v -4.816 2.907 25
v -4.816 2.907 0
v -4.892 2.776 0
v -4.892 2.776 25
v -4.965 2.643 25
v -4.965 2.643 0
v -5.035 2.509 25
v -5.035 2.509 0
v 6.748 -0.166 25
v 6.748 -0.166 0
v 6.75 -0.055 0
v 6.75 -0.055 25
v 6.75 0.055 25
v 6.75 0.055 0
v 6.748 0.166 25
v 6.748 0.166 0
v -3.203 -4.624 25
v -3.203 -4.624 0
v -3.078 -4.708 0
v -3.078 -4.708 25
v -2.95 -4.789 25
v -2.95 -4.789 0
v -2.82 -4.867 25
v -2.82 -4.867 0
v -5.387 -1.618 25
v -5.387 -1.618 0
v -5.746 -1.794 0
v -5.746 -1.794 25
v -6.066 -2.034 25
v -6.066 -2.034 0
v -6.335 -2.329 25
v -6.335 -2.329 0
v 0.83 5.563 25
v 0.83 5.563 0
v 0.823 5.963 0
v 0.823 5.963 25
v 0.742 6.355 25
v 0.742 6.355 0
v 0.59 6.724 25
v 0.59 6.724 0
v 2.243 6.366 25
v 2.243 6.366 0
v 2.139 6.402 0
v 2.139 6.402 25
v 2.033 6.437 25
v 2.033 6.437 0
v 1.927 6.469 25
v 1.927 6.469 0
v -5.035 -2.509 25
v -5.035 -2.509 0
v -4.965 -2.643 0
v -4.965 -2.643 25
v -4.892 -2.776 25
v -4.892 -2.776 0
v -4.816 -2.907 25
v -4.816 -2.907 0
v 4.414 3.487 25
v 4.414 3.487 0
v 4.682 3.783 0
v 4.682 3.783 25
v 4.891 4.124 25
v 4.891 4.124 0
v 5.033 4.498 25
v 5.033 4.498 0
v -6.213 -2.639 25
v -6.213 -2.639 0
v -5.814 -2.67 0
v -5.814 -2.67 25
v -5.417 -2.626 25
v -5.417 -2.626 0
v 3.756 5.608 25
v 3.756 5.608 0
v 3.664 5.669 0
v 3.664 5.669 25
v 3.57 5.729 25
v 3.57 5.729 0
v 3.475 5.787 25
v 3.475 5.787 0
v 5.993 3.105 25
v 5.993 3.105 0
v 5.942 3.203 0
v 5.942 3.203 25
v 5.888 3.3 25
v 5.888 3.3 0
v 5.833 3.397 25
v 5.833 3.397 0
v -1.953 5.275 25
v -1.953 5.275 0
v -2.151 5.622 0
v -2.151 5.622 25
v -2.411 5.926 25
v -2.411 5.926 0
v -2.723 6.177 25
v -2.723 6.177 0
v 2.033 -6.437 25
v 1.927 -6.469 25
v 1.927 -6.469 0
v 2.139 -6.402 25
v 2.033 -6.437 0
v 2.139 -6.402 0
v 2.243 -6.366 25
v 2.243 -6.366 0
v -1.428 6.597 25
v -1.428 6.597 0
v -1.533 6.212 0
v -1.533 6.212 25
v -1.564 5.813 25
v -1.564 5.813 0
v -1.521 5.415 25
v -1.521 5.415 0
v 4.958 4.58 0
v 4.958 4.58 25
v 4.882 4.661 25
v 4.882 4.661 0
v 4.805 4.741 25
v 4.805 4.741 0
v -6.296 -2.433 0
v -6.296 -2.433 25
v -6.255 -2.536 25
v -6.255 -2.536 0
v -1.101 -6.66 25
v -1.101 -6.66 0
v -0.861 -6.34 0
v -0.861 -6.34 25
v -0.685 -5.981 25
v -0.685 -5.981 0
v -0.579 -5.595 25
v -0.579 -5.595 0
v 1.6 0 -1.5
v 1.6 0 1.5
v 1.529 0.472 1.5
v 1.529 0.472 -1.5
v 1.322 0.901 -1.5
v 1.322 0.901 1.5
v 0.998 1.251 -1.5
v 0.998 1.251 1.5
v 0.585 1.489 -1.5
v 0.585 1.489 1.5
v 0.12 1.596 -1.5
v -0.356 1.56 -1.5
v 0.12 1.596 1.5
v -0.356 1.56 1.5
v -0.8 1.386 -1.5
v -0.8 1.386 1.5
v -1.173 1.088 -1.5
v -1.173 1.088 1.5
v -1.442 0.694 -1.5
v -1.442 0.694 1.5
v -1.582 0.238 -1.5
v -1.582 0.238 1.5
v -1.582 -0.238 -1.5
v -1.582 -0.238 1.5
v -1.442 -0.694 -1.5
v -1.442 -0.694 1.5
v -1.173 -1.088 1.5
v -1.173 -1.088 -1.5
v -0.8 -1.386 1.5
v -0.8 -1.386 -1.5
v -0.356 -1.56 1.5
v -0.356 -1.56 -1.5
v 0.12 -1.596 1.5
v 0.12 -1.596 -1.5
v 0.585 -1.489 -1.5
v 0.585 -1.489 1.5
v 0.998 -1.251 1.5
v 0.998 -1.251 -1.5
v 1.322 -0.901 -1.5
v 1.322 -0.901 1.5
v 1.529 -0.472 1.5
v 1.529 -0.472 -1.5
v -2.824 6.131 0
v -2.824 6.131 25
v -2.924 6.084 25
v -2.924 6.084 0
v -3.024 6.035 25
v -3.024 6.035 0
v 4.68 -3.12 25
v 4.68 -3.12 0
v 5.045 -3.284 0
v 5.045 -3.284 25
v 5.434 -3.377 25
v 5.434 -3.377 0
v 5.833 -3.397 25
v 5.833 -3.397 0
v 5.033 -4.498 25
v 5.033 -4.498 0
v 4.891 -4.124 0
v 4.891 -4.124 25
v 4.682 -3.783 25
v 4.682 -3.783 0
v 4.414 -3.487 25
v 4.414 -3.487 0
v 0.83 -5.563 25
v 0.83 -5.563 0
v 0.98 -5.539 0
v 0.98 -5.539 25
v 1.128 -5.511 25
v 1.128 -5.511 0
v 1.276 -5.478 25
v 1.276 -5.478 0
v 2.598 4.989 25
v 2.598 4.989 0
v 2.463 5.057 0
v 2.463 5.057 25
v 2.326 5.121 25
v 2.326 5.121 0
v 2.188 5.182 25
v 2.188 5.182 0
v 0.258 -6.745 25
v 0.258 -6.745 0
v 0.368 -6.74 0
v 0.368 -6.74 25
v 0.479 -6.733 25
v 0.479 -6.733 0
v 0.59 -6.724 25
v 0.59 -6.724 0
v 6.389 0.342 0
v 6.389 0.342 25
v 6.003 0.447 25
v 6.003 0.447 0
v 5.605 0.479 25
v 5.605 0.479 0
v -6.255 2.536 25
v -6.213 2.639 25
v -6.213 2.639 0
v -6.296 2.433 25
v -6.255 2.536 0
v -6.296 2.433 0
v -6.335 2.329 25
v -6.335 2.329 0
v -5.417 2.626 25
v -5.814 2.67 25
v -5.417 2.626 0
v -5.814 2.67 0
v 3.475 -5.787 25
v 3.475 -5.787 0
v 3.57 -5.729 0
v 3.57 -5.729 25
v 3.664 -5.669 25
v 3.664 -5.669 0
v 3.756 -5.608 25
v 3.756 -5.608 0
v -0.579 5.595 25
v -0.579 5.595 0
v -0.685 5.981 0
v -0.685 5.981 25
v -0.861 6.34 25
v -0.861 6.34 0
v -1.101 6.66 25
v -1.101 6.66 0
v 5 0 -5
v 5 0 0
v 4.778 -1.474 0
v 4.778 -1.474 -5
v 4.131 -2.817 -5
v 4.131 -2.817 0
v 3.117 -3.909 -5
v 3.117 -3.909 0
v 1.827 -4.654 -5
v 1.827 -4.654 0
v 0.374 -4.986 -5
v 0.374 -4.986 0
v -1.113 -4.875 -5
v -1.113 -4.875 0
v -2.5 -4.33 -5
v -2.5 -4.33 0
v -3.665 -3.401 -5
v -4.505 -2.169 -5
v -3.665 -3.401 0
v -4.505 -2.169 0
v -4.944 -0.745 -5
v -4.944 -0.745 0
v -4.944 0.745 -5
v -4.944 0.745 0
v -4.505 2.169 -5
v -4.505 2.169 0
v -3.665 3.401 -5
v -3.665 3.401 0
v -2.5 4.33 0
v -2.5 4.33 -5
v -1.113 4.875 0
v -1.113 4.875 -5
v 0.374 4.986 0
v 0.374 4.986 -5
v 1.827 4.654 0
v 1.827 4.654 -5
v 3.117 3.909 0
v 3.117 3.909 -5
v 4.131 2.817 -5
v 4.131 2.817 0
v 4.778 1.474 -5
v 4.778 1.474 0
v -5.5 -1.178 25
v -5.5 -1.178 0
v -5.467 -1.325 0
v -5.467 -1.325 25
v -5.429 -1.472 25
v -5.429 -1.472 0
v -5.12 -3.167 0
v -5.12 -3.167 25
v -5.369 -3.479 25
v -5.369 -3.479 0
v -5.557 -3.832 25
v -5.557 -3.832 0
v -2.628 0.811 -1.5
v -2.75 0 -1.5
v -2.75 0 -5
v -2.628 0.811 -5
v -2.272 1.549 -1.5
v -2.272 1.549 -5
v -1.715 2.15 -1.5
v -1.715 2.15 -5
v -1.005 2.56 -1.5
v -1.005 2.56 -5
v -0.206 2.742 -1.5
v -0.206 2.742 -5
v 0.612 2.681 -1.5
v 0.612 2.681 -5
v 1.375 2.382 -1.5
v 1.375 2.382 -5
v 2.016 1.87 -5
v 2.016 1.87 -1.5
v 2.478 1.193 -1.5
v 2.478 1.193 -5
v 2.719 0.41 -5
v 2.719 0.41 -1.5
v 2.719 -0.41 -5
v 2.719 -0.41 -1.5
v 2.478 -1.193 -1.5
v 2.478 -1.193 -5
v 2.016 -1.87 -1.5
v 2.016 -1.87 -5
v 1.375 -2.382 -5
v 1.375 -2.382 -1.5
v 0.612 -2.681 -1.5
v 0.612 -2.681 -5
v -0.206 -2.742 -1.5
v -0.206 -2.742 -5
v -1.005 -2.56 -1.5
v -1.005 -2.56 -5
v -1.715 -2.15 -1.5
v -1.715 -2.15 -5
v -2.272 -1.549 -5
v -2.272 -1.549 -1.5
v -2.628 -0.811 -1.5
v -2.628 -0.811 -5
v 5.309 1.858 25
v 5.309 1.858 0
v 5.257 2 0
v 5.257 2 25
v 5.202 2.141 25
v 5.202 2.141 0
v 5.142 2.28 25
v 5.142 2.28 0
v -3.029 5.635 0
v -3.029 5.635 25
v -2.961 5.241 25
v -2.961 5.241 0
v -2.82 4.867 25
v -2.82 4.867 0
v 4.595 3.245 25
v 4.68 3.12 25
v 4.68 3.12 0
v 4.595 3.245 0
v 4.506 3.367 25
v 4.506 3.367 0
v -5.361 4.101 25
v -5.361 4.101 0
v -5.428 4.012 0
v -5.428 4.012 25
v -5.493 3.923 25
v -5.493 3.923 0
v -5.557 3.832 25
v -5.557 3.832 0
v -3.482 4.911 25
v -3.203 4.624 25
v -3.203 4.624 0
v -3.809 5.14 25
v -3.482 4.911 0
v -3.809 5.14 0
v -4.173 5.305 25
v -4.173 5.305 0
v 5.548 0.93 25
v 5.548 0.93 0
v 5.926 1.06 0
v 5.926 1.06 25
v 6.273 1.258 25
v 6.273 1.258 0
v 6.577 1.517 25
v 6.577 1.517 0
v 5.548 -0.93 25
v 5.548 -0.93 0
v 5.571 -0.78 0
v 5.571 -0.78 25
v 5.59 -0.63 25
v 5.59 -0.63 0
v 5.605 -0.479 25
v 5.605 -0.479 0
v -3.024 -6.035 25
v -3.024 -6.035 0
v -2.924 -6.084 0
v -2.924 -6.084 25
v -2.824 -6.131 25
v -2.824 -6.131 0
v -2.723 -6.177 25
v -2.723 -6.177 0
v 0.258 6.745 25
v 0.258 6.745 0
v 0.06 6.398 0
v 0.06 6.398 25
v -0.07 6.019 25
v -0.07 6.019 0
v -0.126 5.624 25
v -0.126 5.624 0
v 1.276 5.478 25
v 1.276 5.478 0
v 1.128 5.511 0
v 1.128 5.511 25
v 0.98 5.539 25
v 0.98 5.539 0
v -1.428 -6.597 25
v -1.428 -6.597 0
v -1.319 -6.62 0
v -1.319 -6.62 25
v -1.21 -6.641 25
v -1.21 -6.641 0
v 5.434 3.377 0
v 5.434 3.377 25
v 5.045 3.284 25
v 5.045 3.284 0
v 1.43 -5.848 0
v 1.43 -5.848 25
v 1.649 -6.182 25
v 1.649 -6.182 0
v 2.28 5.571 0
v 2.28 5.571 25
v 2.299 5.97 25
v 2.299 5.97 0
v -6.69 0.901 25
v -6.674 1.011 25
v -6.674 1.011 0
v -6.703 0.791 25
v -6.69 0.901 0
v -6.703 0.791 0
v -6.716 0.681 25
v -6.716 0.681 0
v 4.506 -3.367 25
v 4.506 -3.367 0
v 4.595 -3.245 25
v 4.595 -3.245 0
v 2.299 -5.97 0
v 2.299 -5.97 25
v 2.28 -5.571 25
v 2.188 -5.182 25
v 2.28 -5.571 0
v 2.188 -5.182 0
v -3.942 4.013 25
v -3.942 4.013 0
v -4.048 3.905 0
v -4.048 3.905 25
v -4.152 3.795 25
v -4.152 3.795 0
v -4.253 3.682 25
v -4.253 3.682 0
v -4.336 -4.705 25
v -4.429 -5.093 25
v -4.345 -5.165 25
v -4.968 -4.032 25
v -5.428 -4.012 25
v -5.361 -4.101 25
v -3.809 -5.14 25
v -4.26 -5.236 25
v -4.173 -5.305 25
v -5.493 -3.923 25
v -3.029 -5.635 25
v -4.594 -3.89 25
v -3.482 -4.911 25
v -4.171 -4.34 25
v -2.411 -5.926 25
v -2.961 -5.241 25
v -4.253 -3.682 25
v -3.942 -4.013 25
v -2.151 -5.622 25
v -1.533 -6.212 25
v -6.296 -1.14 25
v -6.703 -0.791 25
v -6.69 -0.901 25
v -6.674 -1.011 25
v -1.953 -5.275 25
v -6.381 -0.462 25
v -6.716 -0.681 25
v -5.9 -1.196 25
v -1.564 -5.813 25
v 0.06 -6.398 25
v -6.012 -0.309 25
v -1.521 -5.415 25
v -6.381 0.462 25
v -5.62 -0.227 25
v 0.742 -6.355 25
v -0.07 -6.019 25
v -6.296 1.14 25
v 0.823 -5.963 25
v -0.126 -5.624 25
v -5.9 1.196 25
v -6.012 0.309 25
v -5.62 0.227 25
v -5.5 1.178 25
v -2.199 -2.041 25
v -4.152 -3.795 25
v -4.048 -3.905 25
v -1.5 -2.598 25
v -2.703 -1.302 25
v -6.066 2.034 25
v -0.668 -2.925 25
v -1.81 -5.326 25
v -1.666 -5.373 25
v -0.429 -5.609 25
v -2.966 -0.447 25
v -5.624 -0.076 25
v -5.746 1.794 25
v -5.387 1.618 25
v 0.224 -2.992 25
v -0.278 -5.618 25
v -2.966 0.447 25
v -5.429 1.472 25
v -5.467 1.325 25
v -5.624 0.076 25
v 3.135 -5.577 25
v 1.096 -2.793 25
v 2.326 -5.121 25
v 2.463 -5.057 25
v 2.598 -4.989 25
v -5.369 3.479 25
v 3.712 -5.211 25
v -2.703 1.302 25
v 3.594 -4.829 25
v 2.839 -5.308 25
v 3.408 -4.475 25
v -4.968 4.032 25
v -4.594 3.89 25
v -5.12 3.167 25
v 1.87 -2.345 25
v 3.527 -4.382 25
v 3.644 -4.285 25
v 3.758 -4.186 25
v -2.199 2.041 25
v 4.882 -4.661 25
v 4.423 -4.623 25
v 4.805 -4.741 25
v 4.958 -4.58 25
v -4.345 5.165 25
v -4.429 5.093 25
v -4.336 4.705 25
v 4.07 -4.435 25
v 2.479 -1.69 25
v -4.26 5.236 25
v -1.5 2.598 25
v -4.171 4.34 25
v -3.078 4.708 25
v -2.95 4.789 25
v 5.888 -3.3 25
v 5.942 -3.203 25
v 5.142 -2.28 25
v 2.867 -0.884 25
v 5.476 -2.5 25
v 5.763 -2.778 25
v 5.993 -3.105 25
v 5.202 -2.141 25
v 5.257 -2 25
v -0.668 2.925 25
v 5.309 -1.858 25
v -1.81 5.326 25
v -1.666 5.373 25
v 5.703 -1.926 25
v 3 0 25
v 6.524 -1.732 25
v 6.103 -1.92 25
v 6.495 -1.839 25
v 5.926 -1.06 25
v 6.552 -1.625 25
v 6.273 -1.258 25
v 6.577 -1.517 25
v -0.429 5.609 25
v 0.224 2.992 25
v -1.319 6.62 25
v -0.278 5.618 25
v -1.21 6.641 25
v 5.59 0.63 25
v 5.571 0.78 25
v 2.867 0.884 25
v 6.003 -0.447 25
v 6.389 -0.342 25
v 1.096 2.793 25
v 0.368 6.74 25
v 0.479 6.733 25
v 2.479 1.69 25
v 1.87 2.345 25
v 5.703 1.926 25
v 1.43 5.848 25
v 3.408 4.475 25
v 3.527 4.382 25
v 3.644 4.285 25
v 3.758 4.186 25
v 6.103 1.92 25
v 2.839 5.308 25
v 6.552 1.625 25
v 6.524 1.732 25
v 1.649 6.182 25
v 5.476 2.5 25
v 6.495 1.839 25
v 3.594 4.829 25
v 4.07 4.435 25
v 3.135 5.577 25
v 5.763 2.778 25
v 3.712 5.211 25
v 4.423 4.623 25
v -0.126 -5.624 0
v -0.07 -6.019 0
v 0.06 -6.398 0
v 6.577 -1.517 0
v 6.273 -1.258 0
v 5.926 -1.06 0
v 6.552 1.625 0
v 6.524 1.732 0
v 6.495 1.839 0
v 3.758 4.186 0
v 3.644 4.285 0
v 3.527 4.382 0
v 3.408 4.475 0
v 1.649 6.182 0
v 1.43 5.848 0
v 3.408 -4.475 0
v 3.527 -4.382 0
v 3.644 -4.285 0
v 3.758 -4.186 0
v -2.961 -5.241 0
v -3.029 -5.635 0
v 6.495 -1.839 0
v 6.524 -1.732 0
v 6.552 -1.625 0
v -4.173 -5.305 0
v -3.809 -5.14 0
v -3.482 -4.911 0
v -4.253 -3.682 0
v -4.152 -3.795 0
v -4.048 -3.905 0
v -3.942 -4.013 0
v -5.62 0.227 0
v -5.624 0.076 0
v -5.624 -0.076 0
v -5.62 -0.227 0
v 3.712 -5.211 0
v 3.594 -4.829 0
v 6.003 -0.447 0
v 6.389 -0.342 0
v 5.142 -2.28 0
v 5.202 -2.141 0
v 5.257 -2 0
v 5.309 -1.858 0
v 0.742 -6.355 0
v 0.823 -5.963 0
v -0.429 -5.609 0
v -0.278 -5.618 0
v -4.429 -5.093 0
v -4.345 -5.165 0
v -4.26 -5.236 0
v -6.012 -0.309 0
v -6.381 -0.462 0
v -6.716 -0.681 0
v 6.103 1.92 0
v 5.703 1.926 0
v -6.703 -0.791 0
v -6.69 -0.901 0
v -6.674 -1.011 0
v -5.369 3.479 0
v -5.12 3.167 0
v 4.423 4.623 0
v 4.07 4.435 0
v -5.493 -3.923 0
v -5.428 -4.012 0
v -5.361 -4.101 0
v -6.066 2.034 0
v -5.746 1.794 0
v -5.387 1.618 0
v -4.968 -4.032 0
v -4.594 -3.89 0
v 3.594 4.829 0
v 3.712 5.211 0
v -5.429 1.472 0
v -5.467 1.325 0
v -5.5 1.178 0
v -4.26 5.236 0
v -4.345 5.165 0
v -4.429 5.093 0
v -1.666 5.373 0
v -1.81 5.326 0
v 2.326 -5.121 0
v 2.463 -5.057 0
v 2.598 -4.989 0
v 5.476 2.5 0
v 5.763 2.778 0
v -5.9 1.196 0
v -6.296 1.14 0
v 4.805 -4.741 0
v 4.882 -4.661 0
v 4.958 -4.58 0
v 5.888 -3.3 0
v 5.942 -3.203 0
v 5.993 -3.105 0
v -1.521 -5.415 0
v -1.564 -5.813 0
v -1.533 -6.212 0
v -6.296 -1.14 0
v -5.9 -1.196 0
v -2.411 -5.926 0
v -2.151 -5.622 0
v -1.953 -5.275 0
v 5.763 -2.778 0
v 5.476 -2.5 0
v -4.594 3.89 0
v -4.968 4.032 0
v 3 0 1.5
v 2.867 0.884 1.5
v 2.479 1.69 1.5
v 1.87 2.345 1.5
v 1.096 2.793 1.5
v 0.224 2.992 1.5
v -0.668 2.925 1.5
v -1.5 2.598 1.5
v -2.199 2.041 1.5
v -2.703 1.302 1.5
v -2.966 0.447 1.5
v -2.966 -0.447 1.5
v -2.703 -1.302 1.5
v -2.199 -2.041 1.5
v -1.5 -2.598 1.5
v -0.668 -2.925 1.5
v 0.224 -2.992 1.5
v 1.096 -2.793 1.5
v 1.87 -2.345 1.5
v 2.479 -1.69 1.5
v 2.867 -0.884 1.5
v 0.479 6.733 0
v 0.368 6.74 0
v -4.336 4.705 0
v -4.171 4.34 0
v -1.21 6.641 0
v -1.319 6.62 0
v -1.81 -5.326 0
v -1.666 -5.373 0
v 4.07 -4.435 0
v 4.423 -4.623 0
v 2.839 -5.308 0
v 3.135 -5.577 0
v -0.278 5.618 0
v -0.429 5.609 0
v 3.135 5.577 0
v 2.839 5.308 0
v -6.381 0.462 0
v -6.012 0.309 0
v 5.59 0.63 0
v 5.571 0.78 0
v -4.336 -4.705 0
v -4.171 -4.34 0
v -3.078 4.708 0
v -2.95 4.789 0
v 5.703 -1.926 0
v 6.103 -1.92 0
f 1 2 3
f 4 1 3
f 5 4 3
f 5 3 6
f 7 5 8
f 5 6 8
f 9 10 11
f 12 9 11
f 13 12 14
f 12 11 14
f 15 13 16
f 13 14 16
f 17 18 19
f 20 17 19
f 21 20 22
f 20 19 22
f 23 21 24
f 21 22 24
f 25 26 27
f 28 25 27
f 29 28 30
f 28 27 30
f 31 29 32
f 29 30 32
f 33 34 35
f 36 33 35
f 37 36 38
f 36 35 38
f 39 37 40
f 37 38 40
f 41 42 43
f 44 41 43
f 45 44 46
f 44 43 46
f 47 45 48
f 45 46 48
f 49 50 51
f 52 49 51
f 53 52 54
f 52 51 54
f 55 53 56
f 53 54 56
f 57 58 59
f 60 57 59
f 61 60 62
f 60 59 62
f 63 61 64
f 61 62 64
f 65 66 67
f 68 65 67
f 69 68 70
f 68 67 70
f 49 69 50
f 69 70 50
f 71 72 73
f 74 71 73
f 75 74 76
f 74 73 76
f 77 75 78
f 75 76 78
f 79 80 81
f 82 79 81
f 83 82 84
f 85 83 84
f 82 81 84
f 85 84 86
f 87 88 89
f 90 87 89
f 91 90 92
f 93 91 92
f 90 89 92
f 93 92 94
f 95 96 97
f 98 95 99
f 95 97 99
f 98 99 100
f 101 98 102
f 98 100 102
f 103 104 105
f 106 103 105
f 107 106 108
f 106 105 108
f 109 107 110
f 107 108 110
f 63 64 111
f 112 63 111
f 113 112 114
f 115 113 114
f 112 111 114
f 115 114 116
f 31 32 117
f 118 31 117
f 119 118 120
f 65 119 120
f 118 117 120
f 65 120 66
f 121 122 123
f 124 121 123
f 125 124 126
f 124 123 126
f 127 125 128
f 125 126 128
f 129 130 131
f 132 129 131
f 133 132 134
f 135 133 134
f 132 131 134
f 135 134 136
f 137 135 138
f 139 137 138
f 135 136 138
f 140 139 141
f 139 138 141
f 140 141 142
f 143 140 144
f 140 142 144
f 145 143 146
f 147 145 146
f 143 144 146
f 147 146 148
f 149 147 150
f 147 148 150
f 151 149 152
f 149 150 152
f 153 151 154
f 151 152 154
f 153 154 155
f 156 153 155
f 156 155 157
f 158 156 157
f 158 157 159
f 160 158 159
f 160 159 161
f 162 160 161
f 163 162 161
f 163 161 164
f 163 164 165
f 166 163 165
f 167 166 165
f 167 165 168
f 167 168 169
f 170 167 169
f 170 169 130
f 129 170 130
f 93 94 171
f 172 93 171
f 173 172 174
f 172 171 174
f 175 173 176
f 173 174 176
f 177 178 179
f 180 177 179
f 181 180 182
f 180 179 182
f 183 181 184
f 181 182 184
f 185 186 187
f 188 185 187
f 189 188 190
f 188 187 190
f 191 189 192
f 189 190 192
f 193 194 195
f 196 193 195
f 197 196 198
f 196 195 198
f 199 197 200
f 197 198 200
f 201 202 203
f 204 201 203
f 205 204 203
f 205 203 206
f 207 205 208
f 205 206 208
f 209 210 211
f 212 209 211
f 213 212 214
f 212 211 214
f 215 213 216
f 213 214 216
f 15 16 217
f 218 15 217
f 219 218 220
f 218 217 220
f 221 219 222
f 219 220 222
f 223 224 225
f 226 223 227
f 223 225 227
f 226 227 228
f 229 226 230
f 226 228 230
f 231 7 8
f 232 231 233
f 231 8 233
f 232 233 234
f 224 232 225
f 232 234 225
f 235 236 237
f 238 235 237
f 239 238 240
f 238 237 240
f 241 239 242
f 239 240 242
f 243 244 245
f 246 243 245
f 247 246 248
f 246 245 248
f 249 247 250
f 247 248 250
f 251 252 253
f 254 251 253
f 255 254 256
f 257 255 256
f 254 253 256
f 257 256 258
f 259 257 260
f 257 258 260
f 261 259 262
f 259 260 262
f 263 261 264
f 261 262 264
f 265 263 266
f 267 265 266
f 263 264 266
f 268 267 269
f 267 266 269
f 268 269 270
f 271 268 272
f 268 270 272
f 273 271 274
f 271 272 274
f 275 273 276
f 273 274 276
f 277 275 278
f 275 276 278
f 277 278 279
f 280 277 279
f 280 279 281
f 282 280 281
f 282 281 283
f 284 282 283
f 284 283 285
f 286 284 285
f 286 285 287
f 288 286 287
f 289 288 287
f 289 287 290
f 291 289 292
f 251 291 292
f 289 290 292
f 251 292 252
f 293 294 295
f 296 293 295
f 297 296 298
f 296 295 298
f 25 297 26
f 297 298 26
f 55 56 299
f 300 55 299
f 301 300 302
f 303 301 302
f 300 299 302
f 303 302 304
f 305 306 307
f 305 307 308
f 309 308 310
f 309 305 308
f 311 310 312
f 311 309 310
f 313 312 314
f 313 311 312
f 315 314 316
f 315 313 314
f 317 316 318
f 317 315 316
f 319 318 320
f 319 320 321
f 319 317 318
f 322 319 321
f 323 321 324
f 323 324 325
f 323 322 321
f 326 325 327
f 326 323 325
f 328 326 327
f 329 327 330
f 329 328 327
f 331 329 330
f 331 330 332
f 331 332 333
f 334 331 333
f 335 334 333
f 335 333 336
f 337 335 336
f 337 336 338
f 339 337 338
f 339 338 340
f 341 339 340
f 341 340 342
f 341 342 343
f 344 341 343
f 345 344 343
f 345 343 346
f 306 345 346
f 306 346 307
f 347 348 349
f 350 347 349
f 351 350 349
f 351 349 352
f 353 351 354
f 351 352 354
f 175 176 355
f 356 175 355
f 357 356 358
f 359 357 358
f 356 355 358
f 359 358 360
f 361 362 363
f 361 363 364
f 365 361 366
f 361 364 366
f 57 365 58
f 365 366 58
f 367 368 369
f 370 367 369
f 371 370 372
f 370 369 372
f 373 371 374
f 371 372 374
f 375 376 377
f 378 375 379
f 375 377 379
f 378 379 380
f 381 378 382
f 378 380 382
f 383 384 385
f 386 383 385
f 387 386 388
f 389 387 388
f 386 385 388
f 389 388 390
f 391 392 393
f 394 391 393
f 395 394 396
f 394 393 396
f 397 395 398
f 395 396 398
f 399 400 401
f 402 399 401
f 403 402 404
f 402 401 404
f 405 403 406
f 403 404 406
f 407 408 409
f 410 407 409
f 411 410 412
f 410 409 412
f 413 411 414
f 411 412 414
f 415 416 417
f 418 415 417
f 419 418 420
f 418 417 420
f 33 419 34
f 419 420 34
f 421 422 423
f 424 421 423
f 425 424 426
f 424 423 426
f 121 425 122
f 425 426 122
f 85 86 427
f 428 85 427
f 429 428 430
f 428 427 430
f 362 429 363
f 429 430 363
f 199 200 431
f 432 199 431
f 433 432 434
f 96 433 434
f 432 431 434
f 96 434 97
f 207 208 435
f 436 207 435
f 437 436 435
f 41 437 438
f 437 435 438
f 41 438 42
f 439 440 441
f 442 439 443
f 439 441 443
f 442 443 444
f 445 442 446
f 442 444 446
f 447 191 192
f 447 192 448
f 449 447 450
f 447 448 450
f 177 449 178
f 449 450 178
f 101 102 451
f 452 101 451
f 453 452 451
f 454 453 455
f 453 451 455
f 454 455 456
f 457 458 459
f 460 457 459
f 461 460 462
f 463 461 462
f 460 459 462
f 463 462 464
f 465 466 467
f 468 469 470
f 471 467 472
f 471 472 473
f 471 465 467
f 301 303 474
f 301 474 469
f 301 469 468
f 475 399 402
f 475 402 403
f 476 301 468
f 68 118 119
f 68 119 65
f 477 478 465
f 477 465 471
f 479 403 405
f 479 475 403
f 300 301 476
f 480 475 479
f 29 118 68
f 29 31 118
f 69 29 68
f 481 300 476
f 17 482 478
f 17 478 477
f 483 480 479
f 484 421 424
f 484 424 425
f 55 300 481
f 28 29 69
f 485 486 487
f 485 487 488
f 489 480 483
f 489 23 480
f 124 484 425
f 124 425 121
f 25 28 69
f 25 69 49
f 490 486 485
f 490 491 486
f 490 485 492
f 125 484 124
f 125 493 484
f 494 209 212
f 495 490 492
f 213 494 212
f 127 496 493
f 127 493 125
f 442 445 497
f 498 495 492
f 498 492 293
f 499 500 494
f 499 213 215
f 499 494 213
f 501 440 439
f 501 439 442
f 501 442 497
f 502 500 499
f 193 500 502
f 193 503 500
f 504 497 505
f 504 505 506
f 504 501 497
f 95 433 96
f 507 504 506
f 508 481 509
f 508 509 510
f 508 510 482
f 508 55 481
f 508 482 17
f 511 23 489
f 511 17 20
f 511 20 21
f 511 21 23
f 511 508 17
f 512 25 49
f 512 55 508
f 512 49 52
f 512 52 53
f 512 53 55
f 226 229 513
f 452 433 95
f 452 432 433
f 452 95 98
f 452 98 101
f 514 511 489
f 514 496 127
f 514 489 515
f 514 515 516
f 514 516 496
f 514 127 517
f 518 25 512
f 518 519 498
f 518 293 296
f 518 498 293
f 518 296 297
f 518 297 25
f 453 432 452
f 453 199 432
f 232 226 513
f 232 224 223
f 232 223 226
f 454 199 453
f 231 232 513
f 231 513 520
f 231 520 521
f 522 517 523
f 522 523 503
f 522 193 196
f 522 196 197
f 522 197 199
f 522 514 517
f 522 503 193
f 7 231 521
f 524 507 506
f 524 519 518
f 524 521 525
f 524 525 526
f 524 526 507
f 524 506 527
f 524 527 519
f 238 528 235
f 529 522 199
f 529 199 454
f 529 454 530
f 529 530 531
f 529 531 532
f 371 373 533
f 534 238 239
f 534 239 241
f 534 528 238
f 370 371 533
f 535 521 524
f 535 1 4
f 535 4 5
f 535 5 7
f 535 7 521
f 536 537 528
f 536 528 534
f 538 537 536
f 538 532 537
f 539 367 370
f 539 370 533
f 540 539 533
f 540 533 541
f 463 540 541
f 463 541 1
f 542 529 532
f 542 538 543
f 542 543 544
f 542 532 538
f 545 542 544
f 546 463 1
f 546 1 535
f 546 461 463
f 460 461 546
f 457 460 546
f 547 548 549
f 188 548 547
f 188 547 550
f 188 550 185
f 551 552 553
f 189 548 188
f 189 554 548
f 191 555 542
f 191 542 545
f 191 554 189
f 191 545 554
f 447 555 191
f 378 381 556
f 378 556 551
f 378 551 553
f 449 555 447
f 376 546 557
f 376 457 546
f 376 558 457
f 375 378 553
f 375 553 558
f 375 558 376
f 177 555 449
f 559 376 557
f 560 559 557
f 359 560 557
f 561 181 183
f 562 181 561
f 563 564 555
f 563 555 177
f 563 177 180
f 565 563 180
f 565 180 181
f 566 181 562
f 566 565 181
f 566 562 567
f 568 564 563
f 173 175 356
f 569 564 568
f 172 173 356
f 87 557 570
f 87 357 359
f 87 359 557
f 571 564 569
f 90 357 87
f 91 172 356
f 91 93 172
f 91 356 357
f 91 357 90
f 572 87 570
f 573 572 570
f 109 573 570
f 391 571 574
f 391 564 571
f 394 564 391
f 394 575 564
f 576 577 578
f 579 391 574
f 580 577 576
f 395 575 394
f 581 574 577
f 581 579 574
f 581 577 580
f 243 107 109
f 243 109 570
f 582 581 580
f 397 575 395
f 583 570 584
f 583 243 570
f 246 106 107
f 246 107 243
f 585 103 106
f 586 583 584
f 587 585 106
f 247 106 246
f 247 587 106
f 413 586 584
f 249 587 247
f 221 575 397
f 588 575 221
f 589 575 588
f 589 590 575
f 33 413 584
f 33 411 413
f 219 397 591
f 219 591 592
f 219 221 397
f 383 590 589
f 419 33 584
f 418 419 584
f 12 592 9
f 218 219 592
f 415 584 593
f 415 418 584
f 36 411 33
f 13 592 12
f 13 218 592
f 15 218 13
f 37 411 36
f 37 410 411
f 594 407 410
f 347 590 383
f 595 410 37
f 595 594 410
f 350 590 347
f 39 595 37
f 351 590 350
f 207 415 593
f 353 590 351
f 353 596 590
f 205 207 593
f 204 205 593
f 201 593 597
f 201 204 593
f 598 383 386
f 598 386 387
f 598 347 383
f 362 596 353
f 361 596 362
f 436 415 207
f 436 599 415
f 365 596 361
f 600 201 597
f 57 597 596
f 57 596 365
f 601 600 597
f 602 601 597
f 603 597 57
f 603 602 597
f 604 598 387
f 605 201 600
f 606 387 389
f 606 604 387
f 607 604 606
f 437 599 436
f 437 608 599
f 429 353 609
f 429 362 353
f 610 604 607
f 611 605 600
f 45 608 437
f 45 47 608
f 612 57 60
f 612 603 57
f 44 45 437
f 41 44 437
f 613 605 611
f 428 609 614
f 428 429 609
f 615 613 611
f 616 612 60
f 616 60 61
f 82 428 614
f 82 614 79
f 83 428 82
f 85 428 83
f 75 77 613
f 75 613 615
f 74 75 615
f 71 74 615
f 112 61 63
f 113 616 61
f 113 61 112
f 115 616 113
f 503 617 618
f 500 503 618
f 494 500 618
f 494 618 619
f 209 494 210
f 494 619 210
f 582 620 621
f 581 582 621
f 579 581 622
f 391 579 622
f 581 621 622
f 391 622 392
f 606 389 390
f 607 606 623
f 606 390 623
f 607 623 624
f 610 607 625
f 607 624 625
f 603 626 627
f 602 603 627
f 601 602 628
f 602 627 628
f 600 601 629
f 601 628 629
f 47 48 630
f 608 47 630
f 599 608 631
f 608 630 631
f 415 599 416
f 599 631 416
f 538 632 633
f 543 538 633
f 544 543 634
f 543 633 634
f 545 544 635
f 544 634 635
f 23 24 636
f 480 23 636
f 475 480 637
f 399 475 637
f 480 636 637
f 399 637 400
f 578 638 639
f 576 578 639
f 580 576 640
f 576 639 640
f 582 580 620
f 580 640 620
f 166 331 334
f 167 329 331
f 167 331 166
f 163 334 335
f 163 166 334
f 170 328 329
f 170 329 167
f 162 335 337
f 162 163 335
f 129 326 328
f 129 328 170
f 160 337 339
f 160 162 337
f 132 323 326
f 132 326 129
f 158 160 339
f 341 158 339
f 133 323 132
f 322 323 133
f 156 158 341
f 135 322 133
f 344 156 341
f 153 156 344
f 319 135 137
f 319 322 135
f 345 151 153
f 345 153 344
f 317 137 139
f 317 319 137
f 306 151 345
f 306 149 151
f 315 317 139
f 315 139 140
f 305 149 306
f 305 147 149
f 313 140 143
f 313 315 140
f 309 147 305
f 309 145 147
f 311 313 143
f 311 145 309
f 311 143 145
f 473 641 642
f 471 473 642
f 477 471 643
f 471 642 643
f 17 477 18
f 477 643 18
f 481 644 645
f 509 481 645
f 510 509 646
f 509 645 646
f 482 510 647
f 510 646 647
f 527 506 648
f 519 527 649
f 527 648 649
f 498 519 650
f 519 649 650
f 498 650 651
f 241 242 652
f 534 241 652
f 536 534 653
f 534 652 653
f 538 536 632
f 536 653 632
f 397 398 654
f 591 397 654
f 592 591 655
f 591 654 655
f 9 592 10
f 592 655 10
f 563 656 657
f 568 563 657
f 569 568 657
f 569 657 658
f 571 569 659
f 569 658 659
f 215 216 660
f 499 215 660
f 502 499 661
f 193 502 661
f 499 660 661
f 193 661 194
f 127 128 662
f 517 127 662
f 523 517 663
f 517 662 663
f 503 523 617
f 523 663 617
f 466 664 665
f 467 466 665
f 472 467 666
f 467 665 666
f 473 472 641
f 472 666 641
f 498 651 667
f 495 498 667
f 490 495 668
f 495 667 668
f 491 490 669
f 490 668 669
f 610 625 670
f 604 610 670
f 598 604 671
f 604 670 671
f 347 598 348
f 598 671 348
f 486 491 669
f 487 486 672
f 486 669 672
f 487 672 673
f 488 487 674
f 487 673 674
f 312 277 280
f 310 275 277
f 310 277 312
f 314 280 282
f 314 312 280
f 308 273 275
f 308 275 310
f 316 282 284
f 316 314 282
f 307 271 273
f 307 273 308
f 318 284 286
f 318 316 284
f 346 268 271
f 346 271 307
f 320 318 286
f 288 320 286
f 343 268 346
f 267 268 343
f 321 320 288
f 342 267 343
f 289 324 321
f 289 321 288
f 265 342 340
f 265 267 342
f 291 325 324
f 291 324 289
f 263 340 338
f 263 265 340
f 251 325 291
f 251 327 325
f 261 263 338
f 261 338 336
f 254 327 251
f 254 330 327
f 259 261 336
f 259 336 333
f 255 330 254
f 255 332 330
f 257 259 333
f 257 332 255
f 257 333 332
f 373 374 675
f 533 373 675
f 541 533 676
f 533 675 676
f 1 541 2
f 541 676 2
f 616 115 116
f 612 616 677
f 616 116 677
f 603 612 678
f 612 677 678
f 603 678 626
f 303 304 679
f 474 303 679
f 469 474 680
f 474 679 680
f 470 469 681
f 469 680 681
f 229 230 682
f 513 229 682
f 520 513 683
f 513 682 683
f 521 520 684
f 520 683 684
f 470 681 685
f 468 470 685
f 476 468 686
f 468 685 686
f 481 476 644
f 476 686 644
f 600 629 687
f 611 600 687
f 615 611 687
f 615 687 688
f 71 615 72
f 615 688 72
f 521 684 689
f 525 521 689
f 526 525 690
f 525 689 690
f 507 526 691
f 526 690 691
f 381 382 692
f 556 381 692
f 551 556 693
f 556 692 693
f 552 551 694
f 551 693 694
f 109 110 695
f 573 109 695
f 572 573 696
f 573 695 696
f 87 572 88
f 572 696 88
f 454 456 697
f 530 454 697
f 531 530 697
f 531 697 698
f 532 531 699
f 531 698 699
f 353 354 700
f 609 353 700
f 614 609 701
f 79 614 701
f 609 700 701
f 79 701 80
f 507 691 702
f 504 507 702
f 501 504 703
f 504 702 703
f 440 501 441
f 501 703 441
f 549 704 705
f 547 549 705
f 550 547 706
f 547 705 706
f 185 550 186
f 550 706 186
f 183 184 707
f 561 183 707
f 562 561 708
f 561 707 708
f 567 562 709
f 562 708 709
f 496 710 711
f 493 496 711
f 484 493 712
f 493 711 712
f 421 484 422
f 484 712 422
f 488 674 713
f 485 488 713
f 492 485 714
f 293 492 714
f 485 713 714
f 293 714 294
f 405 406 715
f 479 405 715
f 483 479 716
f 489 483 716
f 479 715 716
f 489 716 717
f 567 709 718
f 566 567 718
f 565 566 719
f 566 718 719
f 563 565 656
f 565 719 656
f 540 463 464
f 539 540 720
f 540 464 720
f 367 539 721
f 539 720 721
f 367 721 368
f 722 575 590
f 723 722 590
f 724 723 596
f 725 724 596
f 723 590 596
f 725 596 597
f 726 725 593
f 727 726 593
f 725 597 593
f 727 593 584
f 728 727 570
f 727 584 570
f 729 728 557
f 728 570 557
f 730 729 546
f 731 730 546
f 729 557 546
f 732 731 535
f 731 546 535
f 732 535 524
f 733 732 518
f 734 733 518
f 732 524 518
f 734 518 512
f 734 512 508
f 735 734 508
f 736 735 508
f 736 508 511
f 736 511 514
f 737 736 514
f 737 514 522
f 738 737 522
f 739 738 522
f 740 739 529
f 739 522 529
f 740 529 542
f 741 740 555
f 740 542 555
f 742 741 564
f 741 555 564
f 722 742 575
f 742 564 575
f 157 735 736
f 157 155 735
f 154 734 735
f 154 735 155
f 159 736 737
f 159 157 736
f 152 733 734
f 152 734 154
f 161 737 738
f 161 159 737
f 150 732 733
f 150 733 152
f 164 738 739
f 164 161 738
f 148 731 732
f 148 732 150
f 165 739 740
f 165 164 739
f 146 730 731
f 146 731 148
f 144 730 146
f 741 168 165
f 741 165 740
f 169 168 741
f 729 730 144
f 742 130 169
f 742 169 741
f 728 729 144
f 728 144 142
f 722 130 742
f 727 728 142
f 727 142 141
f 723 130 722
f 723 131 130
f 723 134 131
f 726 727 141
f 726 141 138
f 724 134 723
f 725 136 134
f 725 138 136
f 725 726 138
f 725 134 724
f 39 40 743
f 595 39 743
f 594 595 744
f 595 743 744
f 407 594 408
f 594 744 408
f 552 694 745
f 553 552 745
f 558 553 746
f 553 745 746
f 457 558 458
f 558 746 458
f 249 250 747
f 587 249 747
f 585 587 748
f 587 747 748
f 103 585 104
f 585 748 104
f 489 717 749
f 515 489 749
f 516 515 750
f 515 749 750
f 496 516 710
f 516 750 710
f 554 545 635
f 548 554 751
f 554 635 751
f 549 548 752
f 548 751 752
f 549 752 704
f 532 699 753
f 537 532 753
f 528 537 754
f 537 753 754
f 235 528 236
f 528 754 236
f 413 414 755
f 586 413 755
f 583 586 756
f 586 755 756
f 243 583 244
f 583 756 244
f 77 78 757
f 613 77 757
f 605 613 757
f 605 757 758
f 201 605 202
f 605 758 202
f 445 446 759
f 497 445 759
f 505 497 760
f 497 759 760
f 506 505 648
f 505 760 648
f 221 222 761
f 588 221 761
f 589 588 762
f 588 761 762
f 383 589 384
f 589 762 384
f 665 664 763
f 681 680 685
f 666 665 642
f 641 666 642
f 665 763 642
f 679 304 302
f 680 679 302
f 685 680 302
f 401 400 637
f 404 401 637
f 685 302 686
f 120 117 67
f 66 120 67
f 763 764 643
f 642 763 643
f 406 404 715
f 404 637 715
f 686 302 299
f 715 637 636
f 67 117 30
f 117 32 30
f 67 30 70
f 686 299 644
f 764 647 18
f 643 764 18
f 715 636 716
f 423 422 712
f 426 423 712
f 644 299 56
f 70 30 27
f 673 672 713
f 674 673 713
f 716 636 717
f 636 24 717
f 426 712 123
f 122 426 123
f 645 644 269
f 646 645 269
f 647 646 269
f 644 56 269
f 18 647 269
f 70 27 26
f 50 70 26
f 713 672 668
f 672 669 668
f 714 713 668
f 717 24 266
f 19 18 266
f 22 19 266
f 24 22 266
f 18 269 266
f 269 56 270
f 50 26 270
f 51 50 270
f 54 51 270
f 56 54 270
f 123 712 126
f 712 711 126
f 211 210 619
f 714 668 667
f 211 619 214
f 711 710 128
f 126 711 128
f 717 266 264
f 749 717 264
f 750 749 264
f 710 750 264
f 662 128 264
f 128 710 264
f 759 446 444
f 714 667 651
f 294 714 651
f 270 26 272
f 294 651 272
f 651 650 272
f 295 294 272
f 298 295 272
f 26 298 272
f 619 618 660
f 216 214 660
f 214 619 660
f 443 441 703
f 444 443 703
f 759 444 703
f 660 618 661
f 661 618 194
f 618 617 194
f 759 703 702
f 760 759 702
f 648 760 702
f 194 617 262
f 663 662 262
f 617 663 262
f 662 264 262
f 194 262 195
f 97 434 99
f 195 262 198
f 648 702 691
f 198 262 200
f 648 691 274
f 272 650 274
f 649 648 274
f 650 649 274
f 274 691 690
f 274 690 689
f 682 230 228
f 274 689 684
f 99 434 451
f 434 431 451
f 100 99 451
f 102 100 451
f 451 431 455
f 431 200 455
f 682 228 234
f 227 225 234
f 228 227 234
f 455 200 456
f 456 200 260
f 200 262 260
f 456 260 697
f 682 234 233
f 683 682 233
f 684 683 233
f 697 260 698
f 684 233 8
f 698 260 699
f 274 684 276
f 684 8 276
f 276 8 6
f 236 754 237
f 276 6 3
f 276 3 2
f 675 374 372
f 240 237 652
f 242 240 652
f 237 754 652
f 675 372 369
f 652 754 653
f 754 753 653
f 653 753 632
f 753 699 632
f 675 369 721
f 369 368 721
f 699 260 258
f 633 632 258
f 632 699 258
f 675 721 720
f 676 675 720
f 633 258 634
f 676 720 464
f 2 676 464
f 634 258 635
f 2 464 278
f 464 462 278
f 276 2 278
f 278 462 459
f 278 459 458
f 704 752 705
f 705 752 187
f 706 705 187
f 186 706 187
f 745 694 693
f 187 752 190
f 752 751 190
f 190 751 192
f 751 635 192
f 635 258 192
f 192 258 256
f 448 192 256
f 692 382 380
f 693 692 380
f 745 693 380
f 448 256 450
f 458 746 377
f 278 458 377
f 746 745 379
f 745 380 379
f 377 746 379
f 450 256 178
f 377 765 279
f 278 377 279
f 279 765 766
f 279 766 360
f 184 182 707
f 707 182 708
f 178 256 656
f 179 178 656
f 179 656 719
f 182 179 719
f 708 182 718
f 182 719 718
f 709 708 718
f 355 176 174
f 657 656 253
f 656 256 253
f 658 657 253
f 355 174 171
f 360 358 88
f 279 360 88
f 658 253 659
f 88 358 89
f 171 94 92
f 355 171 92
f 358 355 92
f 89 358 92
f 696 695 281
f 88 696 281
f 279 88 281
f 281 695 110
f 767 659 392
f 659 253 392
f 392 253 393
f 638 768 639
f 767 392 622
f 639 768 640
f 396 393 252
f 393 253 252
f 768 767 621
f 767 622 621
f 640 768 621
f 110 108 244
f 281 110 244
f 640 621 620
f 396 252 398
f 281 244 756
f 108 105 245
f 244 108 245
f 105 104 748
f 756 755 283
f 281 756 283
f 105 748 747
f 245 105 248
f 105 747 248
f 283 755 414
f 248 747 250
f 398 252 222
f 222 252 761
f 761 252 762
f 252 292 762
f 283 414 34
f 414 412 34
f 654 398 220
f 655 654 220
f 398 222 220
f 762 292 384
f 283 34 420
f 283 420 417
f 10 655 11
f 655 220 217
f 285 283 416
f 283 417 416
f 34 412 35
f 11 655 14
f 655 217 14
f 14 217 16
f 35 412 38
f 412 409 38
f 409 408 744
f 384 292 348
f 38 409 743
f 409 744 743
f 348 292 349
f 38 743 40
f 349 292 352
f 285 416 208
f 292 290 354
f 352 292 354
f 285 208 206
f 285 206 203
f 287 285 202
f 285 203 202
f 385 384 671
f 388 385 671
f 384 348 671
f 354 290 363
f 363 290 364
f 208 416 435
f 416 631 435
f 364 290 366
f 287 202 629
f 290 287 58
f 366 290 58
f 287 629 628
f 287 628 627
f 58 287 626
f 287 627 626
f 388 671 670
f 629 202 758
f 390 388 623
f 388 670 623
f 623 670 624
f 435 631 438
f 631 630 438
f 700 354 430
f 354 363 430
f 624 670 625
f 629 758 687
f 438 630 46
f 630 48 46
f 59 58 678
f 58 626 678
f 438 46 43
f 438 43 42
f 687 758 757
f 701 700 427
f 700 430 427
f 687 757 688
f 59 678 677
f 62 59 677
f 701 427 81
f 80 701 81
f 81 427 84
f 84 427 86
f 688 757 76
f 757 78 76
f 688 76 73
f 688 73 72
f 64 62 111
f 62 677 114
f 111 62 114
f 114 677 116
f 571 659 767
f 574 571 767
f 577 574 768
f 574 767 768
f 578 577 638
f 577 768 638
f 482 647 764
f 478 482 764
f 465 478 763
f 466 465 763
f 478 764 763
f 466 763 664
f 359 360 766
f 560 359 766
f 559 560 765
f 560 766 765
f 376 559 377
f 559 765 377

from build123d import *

# Parameters (mm, degrees)
EXTRUDE_1_DEPTH     = 25
SKETCH_2_R          = 5
SKETCH_2_R_2        = 2.75
EXTRUDE_2_DEPTH     = 5
SKETCH_3_R          = 3
EXTRUDE_3_DEPTH     = 1.5
SKETCH_4_R          = 3
CUT_EXTRUDE_1_DEPTH = 23.5
SKETCH_5_R          = 1.6
CUT_EXTRUDE_2_DEPTH = 26.363528361


with BuildPart() as part:
    # 草图1 → 凸台-拉伸1 (new body)
    with BuildSketch(Plane.XY):
        with BuildLine():
            ThreePointArc((-0.126349393, 5.623580784), (-0.353196672, 5.613900347), (-0.579468474, 5.595072947))
            ThreePointArc((-0.579468474, 5.595072947), (-0.765010507, 6.164212032), (-1.101088476, 6.659587387))
            ThreePointArc((-1.101088476, 6.659587387), (-1.264823873, 6.630438942), (-1.427791454, 6.597265461))
            ThreePointArc((-1.427791454, 6.597265461), (-1.557909016, 6.012958552), (-1.520907565, 5.415483836))
            ThreePointArc((-1.520907565, 5.415483836), (-1.738220593, 5.349692904), (-1.952701466, 5.275185493))
            ThreePointArc((-1.952701466, 5.275185493), (-2.27395349, 5.7803016), (-2.722667793, 6.176534634))
            ThreePointArc((-2.722667793, 6.176534634), (-2.874010218, 6.107582604), (-3.023607963, 6.03492294))
            ThreePointArc((-3.023607963, 6.03492294), (-3.004326424, 5.436614185), (-2.819901521, 4.867112122))
            ThreePointArc((-2.819901521, 4.867112122), (-3.014025722, 4.749344581), (-3.203239044, 4.623838733))
            ThreePointArc((-3.203239044, 4.623838733), (-3.640015612, 5.033193559), (-4.173171879, 5.305387495))
            ThreePointArc((-4.173171879, 5.305387495), (-4.302611931, 5.200964389), (-4.429440063, 5.093384015))
            ThreePointArc((-4.429440063, 5.093384015), (-4.261970953, 4.518667354), (-3.941710694, 4.012921854))
            ThreePointArc((-3.941710694, 4.012921854), (-4.100448529, 3.850577471), (-4.252505332, 3.68195918))
            ThreePointArc((-4.252505332, 3.68195918), (-4.777362166, 3.969831456), (-5.361460228, 4.100883347))
            ThreePointArc((-5.361460228, 4.100883347), (-5.460864712, 3.967550453), (-5.556954155, 3.831809041))
            ThreePointArc((-5.556954155, 3.831809041), (-5.251820172, 3.316796034), (-4.815847687, 2.906584947))
            ThreePointArc((-4.815847687, 2.906584947), (-4.929225075, 2.709864417), (-5.03457107, 2.508728591))
            ThreePointArc((-5.03457107, 2.508728591), (-5.614529486, 2.657030243), (-6.212868313, 2.638705616))
            ThreePointArc((-6.212868313, 2.638705616), (-6.27599128, 2.484840731), (-6.335304379, 2.329467412))
            ThreePointArc((-6.335304379, 2.329467412), (-5.911678216, 1.906518221), (-5.387387259, 1.617616618))
            ThreePointArc((-5.387387259, 1.617616618), (-5.448280281, 1.398880615), (-5.500296192, 1.177865357))
            ThreePointArc((-5.500296192, 1.177865357), (-6.098915269, 1.177278047), (-6.673899032, 1.010728308))
            ThreePointArc((-6.673899032, 1.010728308), (-6.696774234, 0.845999327), (-6.71558413, 0.680756778))
            ThreePointArc((-6.71558413, 0.680756778), (-6.200083775, 0.376446857), (-5.620417476, 0.227007488))
            ThreePointArc((-5.620417476, 0.227007488), (-5.625, 0), (-5.620417476, -0.227007488))
            ThreePointArc((-5.620417476, -0.227007488), (-6.200083775, -0.376446857), (-6.71558413, -0.680756778))
            ThreePointArc((-6.71558413, -0.680756778), (-6.696774234, -0.845999327), (-6.673899032, -1.010728308))
            ThreePointArc((-6.673899032, -1.010728308), (-6.098915269, -1.177278047), (-5.500296192, -1.177865357))
            ThreePointArc((-5.500296192, -1.177865357), (-5.448280281, -1.398880615), (-5.387387259, -1.617616618))
            ThreePointArc((-5.387387259, -1.617616618), (-5.911678216, -1.906518221), (-6.335304379, -2.329467412))
            ThreePointArc((-6.335304379, -2.329467412), (-6.27599128, -2.484840731), (-6.212868313, -2.638705616))
            ThreePointArc((-6.212868313, -2.638705616), (-5.614529486, -2.657030243), (-5.03457107, -2.508728591))
            ThreePointArc((-5.03457107, -2.508728591), (-4.929225075, -2.709864417), (-4.815847687, -2.906584947))
            ThreePointArc((-4.815847687, -2.906584947), (-5.251820172, -3.316796034), (-5.556954155, -3.831809041))
            ThreePointArc((-5.556954155, -3.831809041), (-5.460864712, -3.967550453), (-5.361460228, -4.100883347))
            ThreePointArc((-5.361460228, -4.100883347), (-4.777362166, -3.969831456), (-4.252505332, -3.68195918))
            ThreePointArc((-4.252505332, -3.68195918), (-4.100448529, -3.850577471), (-3.941710694, -4.012921854))
            ThreePointArc((-3.941710694, -4.012921854), (-4.261970953, -4.518667354), (-4.429440063, -5.093384015))
            ThreePointArc((-4.429440063, -5.093384015), (-4.302611931, -5.200964389), (-4.173171879, -5.305387495))
            ThreePointArc((-4.173171879, -5.305387495), (-3.640015612, -5.033193559), (-3.203239044, -4.623838733))
            ThreePointArc((-3.203239044, -4.623838733), (-3.014025722, -4.749344581), (-2.819901521, -4.867112122))
            ThreePointArc((-2.819901521, -4.867112122), (-3.004326424, -5.436614185), (-3.023607963, -6.03492294))
            ThreePointArc((-3.023607963, -6.03492294), (-2.874010218, -6.107582604), (-2.722667793, -6.176534634))
            ThreePointArc((-2.722667793, -6.176534634), (-2.27395349, -5.7803016), (-1.952701466, -5.275185493))
            ThreePointArc((-1.952701466, -5.275185493), (-1.738220593, -5.349692904), (-1.520907565, -5.415483836))
            ThreePointArc((-1.520907565, -5.415483836), (-1.557909016, -6.012958552), (-1.427791454, -6.597265461))
            ThreePointArc((-1.427791454, -6.597265461), (-1.264823873, -6.630438942), (-1.101088476, -6.659587387))
            ThreePointArc((-1.101088476, -6.659587387), (-0.765010507, -6.164212032), (-0.579468474, -5.595072947))
            ThreePointArc((-0.579468474, -5.595072947), (-0.353196672, -5.613900347), (-0.126349393, -5.623580784))
            ThreePointArc((-0.126349393, -5.623580784), (-0.013602456, -6.21148662), (0.257738444, -6.745077531))
            ThreePointArc((0.257738444, -6.745077531), (0.423836007, -6.736680417), (0.589676279, -6.724193772))
            ThreePointArc((0.589676279, -6.724193772), (0.7920009, -6.160802353), (0.830174654, -5.563401392))
            ThreePointArc((0.830174654, -5.563401392), (1.054019895, -5.525365785), (1.276147777, -5.478327469))
            ThreePointArc((1.276147777, -5.478327469), (1.531558797, -6.019724139), (1.927073686, -6.469071572))
            ThreePointArc((1.927073686, -6.469071572), (2.085864712, -6.419631485), (2.243389504, -6.366294333))
            ThreePointArc((2.243389504, -6.366294333), (2.299247977, -5.770286804), (2.187654855, -5.182160866))
            ThreePointArc((2.187654855, -5.182160866), (2.395008515, -5.08965217), (2.598459887, -4.988850691))
            ThreePointArc((2.598459887, -4.988850691), (2.980486578, -5.449720251), (3.475323802, -5.786590055))
            ThreePointArc((3.475323802, -5.786590055), (3.616830866, -5.699213497), (3.756142317, -5.608377207))
            ThreePointArc((3.756142317, -5.608377207), (3.662024848, -5.017202913), (3.407676656, -4.475306114))
            ThreePointArc((3.407676656, -4.475306114), (3.585509942, -4.334136991), (3.757501207, -4.185906076))
            ThreePointArc((3.757501207, -4.185906076), (4.242139425, -4.537290397), (4.805206542, -4.740515804))
            ThreePointArc((4.805206542, -4.740515804), (4.920538235, -4.620692965), (5.032882894, -4.498065115))
            ThreePointArc((5.032882894, -4.498065115), (4.79470323, -3.948869711), (4.4135816, -3.48725142))
            ThreePointArc((4.4135816, -3.48725142), (4.550720593, -3.306292044), (4.680444907, -3.119945588))
            ThreePointArc((4.680444907, -3.119945588), (5.237243052, -3.339765901), (5.833160483, -3.39657751))
            ThreePointArc((5.833160483, -3.39657751), (5.91507009, -3.2518373), (5.993388929, -3.105123049))
            ThreePointArc((5.993388929, -3.105123049), (5.626112774, -2.632414502), (5.14216498, -2.280079894))
            ThreePointArc((5.14216498, -2.280079894), (5.229992733, -2.070700609), (5.30929904, -1.857947445))
            ThreePointArc((5.30929904, -1.857947445), (5.903271436, -1.93239163), (6.494595498, -1.839219759))
            ThreePointArc((6.494595498, -1.839219759), (6.537936338, -1.678656738), (6.577308295, -1.517074682))
            ThreePointArc((6.577308295, -1.517074682), (6.104012961, -1.150555009), (5.547647223, -0.929642562))
            ThreePointArc((5.547647223, -0.929642562), (5.580645195, -0.704999439), (5.604550388, -0.47920763))
            ThreePointArc((5.604550388, -0.47920763), (6.198375565, -0.403598087), (6.747951192, -0.166297067))
            ThreePointArc((6.747951192, -0.166297067), (6.75, 0), (6.747951192, 0.166297067))
            ThreePointArc((6.747951192, 0.166297067), (6.198375565, 0.403598087), (5.604550388, 0.47920763))
            ThreePointArc((5.604550388, 0.47920763), (5.580645195, 0.704999439), (5.547647223, 0.929642562))
            ThreePointArc((5.547647223, 0.929642562), (6.104012961, 1.150555009), (6.577308295, 1.517074682))
            ThreePointArc((6.577308295, 1.517074682), (6.537936338, 1.678656738), (6.494595498, 1.839219759))
            ThreePointArc((6.494595498, 1.839219759), (5.903271436, 1.93239163), (5.30929904, 1.857947445))
            ThreePointArc((5.30929904, 1.857947445), (5.229992733, 2.070700609), (5.14216498, 2.280079894))
            ThreePointArc((5.14216498, 2.280079894), (5.626112774, 2.632414502), (5.993388929, 3.105123049))
            ThreePointArc((5.993388929, 3.105123049), (5.91507009, 3.2518373), (5.833160483, 3.39657751))
            ThreePointArc((5.833160483, 3.39657751), (5.237243052, 3.339765901), (4.680444907, 3.119945588))
            ThreePointArc((4.680444907, 3.119945588), (4.550720593, 3.306292044), (4.4135816, 3.48725142))
            ThreePointArc((4.4135816, 3.48725142), (4.79470323, 3.948869711), (5.032882894, 4.498065115))
            ThreePointArc((5.032882894, 4.498065115), (4.920538235, 4.620692965), (4.805206542, 4.740515804))
            ThreePointArc((4.805206542, 4.740515804), (4.242139425, 4.537290397), (3.757501207, 4.185906076))
            ThreePointArc((3.757501207, 4.185906076), (3.585509942, 4.334136991), (3.407676656, 4.475306114))
            ThreePointArc((3.407676656, 4.475306114), (3.662024848, 5.017202913), (3.756142317, 5.608377207))
            ThreePointArc((3.756142317, 5.608377207), (3.616830866, 5.699213497), (3.475323802, 5.786590055))
            ThreePointArc((3.475323802, 5.786590055), (2.980486578, 5.449720251), (2.598459887, 4.988850691))
            ThreePointArc((2.598459887, 4.988850691), (2.395008515, 5.08965217), (2.187654855, 5.182160866))
            ThreePointArc((2.187654855, 5.182160866), (2.299247977, 5.770286804), (2.243389504, 6.366294333))
            ThreePointArc((2.243389504, 6.366294333), (2.085864712, 6.419631485), (1.927073686, 6.469071572))
            ThreePointArc((1.927073686, 6.469071572), (1.531558797, 6.019724139), (1.276147777, 5.478327469))
            ThreePointArc((1.276147777, 5.478327469), (1.054019895, 5.525365785), (0.830174654, 5.563401392))
            ThreePointArc((0.830174654, 5.563401392), (0.7920009, 6.160802353), (0.589676279, 6.724193772))
            ThreePointArc((0.589676279, 6.724193772), (0.423836007, 6.736680417), (0.257738444, 6.745077531))
            ThreePointArc((0.257738444, 6.745077531), (-0.013602456, 6.21148662), (-0.126349393, 5.623580784))
        make_face()
    extrude(amount=EXTRUDE_1_DEPTH)

    # 草图2 → 凸台-拉伸2 (add)
    with BuildSketch(Plane(origin=(0, 0, 0), x_dir=(-1, 0, 0), z_dir=(0, 0, -1))):
        with Locations(Location((0, 0, 0), (0, 0, 180))):
            Circle(SKETCH_2_R)
        Circle(SKETCH_2_R_2, mode=Mode.SUBTRACT)
    extrude(amount=EXTRUDE_2_DEPTH)

    # 草图3 → 凸台-拉伸3 (add)
    with BuildSketch(Plane(origin=(0, 0, 0), x_dir=(-1, 0, 0), z_dir=(0, 0, -1))):
        Circle(SKETCH_3_R)
    extrude(amount=EXTRUDE_3_DEPTH)

    # 草图4 → 切除-拉伸1 (cut)
    with BuildSketch(Plane.XY.offset(25)):
        Circle(SKETCH_4_R)
    extrude(amount=-CUT_EXTRUDE_1_DEPTH, mode=Mode.SUBTRACT)

    # 草图5 → 切除-拉伸2 (cut, through all)
    with BuildSketch(Plane.XY.offset(1.5)):
        Circle(SKETCH_5_R)
    extrude(amount=-CUT_EXTRUDE_2_DEPTH, mode=Mode.SUBTRACT)


solid = part.part
